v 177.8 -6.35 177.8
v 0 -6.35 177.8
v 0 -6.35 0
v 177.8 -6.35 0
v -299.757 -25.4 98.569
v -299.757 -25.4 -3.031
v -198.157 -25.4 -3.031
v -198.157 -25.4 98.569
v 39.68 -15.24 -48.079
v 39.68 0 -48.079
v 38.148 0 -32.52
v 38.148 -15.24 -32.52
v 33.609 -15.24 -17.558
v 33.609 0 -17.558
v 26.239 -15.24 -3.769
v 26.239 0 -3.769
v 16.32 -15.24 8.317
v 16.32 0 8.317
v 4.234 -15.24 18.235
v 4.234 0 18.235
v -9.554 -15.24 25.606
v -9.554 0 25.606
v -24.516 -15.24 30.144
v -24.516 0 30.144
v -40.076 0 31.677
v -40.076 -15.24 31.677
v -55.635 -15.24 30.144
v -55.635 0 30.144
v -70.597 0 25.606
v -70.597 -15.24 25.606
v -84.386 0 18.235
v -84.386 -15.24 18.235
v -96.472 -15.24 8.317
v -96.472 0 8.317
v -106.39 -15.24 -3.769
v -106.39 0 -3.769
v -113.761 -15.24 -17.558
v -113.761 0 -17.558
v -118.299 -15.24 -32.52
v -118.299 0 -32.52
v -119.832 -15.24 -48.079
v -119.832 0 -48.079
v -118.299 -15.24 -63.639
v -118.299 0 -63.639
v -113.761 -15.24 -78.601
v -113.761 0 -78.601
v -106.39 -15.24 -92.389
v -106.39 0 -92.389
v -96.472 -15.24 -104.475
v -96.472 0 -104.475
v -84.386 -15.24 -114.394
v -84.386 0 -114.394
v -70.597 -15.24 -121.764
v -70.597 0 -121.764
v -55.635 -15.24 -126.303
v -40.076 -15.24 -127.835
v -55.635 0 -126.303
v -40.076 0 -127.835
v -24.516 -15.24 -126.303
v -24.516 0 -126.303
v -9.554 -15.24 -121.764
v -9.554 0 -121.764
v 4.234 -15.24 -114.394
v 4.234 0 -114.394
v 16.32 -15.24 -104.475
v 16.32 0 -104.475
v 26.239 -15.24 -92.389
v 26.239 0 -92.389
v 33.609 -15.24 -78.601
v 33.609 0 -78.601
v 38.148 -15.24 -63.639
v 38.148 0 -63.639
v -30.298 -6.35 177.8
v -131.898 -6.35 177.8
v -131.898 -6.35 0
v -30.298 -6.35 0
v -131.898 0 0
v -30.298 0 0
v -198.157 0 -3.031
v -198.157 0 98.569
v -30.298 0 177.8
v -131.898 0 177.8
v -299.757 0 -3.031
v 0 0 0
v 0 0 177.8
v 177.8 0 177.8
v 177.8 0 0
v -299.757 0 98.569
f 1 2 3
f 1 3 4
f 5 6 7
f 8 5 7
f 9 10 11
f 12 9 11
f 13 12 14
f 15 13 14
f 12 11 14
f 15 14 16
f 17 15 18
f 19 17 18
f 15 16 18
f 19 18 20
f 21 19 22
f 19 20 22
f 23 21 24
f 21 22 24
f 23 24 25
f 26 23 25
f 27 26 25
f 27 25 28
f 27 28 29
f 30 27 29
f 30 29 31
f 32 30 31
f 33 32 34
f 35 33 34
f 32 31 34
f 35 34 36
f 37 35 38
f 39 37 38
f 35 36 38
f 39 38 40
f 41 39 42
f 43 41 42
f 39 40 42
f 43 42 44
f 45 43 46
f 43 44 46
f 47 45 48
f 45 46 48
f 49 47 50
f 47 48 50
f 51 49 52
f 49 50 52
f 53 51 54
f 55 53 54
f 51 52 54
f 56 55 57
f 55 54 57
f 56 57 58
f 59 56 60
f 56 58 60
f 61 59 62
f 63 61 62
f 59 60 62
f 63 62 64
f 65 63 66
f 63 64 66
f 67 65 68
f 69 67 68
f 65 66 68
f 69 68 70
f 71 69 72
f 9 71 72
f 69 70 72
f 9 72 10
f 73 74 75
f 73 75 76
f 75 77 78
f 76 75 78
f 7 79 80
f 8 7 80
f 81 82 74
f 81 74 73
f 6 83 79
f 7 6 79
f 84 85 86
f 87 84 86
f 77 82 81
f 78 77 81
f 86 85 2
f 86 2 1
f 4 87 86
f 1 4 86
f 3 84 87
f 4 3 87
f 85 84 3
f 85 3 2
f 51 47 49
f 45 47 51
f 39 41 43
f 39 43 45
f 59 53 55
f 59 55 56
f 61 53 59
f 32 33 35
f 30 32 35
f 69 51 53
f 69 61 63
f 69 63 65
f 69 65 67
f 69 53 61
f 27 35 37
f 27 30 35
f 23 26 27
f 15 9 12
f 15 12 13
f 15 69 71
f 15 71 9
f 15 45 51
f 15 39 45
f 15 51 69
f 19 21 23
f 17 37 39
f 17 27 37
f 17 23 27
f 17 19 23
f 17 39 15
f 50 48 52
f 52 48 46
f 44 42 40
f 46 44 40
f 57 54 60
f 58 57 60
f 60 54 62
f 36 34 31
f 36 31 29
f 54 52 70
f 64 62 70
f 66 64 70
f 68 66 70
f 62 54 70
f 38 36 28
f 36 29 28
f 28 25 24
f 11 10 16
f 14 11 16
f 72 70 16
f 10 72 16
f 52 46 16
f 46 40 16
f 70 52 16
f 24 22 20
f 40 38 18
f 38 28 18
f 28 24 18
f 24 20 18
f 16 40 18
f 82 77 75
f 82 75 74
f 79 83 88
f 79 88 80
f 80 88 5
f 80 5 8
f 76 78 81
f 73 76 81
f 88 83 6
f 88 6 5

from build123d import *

# Parameters (mm, degrees)
F0_W     = 177.8
F0_H     = 177.8
F2_DEPTH = 6.35
F1_W     = 101.6
F1_H     = 177.8
F3_DEPTH = 6.35
F4_R     = 79.756
F5_DEPTH = 15.24
F6_W     = 101.6
F6_H     = 101.6
F7_DEPTH = 25.4


with BuildPart() as f2:
    # F0 (on Front) → F2 (new body)
    with BuildSketch(Plane.XZ):
        with Locations((88.9, 88.9)):
            Rectangle(F0_W, F0_H)
    extrude(amount=F2_DEPTH)


with BuildPart() as f3:
    # F1 (on Front) → F3 (new body)
    with BuildSketch(Plane.XZ):
        with Locations((-81.097622, 88.9)):
            Rectangle(F1_W, F1_H)
    extrude(amount=F3_DEPTH)


with BuildPart() as f5:
    # F4 (on Front) → F5 (new body)
    with BuildSketch(Plane.XZ):
        with Locations((-40.07576, -48.07923)):
            Circle(F4_R)
    extrude(amount=F5_DEPTH)


with BuildPart() as f7:
    # F6 (on Front) → F7 (new body)
    with BuildSketch(Plane.XZ):
        with Locations((-248.957336, 47.769103)):
            Rectangle(F6_W, F6_H)
    extrude(amount=F7_DEPTH)


solid = Compound([f2.part, f3.part, f5.part, f7.part])
